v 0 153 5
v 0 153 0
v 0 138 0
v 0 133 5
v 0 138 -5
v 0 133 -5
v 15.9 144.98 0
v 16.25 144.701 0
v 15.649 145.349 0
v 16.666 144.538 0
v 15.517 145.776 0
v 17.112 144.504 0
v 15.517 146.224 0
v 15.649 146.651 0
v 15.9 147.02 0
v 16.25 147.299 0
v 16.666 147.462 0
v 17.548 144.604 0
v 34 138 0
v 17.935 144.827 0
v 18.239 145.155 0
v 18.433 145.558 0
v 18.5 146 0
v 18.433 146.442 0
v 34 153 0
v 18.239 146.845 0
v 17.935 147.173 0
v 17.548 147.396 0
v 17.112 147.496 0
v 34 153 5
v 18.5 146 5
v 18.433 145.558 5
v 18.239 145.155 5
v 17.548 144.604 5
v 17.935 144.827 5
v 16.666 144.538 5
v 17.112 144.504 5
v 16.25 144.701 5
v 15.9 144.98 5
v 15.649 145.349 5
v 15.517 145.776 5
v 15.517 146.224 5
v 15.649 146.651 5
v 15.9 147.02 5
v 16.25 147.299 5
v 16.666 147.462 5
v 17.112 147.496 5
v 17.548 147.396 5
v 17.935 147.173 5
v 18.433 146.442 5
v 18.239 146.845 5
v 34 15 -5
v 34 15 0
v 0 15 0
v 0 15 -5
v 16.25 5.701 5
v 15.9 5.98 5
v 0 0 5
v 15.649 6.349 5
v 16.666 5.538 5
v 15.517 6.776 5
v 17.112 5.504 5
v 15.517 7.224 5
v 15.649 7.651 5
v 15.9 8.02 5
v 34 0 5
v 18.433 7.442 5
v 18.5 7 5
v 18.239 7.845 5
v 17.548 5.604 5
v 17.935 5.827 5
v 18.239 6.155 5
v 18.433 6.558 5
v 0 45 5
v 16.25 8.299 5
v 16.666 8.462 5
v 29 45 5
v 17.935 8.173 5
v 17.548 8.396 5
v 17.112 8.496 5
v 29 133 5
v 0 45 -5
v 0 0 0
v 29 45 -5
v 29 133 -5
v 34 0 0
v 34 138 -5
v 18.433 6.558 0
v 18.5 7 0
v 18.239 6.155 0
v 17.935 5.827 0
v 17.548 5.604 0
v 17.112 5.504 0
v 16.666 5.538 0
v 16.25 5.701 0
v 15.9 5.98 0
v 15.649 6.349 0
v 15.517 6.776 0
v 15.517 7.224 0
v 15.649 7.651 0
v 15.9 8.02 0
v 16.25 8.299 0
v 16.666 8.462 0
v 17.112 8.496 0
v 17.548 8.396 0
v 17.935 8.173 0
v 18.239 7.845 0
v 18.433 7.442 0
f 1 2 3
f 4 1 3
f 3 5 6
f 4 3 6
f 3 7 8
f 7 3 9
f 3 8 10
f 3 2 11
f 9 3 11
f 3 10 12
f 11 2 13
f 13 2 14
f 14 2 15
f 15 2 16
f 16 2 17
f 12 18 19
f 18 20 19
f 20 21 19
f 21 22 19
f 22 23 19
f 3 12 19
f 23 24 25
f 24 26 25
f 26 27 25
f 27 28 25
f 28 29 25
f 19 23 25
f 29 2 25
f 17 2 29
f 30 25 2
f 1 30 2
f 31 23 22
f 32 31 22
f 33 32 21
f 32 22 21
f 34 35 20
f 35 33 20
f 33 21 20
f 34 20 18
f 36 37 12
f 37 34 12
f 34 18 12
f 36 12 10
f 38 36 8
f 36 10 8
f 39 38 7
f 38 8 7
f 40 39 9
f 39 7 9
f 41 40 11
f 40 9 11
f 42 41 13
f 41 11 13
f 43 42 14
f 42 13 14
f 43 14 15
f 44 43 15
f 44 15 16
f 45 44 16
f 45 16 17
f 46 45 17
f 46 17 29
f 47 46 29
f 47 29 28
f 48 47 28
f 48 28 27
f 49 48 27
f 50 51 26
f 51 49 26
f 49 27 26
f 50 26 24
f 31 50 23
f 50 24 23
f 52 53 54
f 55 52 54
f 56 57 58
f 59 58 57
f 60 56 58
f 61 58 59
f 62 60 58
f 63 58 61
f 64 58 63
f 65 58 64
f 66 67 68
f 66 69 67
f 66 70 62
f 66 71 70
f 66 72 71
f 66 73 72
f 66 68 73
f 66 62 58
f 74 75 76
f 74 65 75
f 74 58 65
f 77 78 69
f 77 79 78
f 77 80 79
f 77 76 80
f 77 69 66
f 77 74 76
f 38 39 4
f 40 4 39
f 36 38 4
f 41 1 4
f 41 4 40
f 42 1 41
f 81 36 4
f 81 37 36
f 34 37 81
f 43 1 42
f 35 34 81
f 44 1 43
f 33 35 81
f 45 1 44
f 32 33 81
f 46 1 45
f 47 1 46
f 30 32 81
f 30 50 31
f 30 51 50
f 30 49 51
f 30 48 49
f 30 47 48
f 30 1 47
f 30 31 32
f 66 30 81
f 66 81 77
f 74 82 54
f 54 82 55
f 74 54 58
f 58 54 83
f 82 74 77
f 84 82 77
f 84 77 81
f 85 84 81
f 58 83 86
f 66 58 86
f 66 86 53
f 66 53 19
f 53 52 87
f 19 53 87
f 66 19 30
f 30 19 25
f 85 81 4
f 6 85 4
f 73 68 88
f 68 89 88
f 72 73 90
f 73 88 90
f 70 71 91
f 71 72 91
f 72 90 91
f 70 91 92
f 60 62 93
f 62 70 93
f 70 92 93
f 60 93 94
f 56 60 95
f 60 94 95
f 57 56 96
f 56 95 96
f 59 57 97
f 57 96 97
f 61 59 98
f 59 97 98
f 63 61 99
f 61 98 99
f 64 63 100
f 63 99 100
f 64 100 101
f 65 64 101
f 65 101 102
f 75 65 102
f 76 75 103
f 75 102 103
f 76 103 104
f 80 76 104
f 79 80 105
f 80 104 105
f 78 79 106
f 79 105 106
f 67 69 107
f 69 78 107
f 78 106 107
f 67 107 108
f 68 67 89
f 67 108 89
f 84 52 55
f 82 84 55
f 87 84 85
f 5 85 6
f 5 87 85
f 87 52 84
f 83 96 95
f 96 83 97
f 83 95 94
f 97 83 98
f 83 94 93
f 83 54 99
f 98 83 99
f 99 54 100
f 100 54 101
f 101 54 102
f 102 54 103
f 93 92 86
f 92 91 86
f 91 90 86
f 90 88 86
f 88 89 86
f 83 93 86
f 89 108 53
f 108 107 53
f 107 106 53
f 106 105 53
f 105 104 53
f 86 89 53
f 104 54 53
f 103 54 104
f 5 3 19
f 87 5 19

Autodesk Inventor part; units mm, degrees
ref_plane "YZ Plane" through (0, 0, 0) normal (1, 0, 0) x (0, 1, 0)
ref_plane "XZ Plane" through (0, 0, 0) normal (0, 1, 0) x (-1, 0, 0)
ref_plane "XY Plane" through (0, 0, 0) normal (0, 0, 1) x (1, 0, 0)
sketch "Sketch1" plane through (0, 0, 0) normal (0, 0, 1) x (1, 0, 0)
  line L0 (0, 0) -> (34, 0)
  line L1 (34, 0) -> (34, 153)
  line L2 (34, 153) -> (0, 153)
  line L3 (0, 153) -> (0, 0)
  circle A0 centre (17, 7) radius 1.5
  circle A1 centre (17, 146) radius 1.5
  point P0 (17, 153)
  point P1 (17, 0)
  dimension "d0" = 34
  dimension "d1" = 153
  dimension "d2" = 3
  dimension "d4" = 7
  dimension "d5" = 3
  dimension "d6" = 7
extrude "Extrusion1" add sketch "Sketch1" along normal blind 5
sketch "Sketch2" plane through (0, 0, 0) normal (0, 0, -1) x (-1, 0, 0)
  line L0 (0, 153) -> (0, 0) projected
  line L1 (0, 138) -> (-34, 138)
  line L2 (-34, 138) -> (-34, 15)
  line L3 (-34, 15) -> (0, 15)
  line L4 (0, 15) -> (0, 138)
  line L5 (-34, 0) -> (-34, 153) projected
  point P0 (0, 76.5)
  dimension "d10" = 123
extrude "Extrusion2" add sketch "Sketch2" along normal blind 5
sketch "Sketch7" plane through (0, 0, 5) normal (0, 0, 1) x (1, 0, 0)
  line L0 (29, 133) -> (0, 133)
  line L1 (0, 133) -> (0, 45)
  line L2 (0, 45) -> (29, 45)
  line L3 (29, 45) -> (29, 133)
  line L4 (34, 0) -> (34, 153) projected
  line L5 (34, 153) -> (0, 153) projected
  line L6 (0, 15) -> (34, 15) projected
  line L7 (34, 138) -> (0, 138) projected
  line L8 (0, 153) -> (0, 0) projected
  point P0 (29, 89)
  point P1 (17, 153)
  dimension "d33" = 30
  dimension "d34" = 5
  dimension "d35" = 5
extrude "Extrusion5" cut sketch "Sketch7" against normal through all contours L3 L2 L1 L0
properties part number "BP005" material "ABS Plastic"
